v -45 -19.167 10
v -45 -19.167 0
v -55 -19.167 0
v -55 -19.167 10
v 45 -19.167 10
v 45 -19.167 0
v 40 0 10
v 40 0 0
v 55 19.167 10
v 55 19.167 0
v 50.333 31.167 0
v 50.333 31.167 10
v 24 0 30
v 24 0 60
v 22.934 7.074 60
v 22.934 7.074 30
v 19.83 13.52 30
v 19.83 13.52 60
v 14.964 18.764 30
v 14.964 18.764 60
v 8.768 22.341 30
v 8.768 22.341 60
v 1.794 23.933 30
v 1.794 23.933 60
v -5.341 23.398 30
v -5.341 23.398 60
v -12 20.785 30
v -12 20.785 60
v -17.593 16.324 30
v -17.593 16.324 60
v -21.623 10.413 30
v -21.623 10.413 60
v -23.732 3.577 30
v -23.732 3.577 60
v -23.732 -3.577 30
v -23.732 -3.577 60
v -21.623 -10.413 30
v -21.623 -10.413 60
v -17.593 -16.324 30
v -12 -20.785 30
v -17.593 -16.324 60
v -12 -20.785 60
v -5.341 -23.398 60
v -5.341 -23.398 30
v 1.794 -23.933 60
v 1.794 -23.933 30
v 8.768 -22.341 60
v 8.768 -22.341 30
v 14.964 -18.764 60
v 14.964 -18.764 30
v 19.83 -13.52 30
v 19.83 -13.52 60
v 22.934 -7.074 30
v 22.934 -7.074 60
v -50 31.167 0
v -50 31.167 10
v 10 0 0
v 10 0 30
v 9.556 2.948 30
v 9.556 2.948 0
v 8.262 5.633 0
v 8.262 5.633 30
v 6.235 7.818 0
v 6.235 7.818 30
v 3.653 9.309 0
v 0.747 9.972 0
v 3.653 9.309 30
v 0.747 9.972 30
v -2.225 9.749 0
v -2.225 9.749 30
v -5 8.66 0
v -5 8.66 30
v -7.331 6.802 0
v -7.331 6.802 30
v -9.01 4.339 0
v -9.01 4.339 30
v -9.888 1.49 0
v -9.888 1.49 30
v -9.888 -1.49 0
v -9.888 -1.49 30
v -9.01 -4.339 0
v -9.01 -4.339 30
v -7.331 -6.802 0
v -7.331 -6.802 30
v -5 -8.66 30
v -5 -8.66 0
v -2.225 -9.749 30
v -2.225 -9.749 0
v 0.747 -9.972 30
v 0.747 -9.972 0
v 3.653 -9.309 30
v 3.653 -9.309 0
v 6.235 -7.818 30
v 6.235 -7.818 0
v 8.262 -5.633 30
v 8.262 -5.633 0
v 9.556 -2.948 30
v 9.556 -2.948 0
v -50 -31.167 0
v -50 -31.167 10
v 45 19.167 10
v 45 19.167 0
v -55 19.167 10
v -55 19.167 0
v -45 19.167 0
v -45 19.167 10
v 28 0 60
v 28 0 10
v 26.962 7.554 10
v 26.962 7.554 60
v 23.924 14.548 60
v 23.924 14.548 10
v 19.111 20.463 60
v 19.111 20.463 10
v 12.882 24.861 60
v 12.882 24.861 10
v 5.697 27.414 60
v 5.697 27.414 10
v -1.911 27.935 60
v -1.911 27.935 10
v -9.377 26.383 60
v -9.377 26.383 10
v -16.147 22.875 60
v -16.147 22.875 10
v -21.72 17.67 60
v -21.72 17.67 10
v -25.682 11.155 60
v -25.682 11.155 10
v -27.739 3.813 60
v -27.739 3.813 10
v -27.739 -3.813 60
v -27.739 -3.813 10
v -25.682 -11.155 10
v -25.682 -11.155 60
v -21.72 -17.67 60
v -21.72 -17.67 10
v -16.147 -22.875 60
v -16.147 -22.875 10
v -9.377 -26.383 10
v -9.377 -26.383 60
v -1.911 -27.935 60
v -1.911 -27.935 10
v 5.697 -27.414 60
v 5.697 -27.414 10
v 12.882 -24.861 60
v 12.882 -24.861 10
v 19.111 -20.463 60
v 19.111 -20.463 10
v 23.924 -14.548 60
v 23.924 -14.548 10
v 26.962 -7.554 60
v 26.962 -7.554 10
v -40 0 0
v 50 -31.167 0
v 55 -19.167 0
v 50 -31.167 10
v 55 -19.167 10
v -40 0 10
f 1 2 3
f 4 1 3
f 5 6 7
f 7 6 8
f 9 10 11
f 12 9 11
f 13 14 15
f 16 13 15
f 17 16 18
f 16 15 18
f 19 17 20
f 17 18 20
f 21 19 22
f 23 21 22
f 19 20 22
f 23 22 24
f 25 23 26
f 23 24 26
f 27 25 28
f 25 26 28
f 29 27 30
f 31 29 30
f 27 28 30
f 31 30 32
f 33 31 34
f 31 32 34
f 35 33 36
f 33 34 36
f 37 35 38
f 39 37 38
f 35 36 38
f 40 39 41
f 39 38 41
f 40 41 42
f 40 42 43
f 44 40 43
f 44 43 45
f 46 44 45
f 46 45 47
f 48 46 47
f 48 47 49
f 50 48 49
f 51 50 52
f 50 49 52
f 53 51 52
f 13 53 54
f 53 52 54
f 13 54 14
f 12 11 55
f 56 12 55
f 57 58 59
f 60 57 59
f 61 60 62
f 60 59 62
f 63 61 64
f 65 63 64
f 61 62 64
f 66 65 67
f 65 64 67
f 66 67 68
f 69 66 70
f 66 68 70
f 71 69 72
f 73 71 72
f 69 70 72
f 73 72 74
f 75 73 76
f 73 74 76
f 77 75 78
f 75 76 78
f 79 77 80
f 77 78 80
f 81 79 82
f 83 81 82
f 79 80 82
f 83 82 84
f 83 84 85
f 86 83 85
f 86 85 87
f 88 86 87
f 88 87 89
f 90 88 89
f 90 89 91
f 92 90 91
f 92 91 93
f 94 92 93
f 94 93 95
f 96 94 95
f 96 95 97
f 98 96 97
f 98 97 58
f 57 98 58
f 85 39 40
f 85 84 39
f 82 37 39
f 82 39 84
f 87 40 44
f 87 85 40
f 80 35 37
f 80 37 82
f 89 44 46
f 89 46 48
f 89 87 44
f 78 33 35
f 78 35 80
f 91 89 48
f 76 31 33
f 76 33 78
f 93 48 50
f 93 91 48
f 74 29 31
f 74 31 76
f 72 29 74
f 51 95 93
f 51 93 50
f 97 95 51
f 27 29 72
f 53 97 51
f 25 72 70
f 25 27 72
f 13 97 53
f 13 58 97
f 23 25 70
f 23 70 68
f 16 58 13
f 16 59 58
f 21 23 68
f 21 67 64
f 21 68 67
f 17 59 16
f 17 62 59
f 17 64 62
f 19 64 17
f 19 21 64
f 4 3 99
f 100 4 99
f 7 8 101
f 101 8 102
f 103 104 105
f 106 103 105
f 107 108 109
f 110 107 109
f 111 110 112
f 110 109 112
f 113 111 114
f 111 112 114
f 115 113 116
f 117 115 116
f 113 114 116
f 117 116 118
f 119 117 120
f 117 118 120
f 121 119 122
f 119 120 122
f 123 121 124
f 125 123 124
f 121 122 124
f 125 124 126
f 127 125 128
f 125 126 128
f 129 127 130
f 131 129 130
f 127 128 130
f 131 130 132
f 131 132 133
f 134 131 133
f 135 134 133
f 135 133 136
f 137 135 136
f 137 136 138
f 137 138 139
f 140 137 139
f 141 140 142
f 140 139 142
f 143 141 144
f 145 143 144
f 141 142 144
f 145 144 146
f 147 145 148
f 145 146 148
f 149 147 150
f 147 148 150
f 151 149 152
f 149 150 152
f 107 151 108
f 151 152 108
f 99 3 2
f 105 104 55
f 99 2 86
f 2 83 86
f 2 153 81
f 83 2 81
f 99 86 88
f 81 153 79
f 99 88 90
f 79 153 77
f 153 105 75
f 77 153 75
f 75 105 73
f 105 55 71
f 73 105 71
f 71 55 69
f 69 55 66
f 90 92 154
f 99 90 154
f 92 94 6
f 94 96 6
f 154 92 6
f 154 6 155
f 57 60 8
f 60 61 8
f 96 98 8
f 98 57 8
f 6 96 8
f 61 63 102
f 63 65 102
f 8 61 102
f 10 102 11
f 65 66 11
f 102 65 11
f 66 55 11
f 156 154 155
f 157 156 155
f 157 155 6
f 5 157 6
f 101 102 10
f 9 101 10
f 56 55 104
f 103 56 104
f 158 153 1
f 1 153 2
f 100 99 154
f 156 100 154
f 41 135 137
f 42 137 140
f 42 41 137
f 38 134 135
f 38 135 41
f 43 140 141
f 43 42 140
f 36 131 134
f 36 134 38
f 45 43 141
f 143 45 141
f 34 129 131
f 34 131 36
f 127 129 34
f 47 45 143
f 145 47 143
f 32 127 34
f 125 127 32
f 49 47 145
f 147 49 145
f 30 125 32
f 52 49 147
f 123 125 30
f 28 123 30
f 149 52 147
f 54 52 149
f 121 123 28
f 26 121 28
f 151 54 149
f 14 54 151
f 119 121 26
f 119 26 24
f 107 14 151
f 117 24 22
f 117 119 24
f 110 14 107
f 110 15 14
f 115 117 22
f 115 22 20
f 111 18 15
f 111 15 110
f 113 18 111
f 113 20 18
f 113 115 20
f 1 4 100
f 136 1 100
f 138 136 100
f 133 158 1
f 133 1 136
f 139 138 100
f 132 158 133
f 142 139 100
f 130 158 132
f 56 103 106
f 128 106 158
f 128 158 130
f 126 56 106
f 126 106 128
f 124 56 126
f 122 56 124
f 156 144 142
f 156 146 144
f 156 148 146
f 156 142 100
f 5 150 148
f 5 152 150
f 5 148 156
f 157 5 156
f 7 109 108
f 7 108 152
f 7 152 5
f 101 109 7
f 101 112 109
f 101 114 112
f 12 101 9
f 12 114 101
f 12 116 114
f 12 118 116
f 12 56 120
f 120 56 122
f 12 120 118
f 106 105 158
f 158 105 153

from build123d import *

# Parameters (mm, degrees)
EXTRUDE_1_DEPTH     = 10
SKETCH_2_R          = 28
EXTRUDE_2_DEPTH     = 50
SKETCH_3_R          = 24
CUT_EXTRUDE_1_DEPTH = 30
SKETCH_4_R          = 10
CUT_EXTRUDE_2_DEPTH = 60


with BuildPart() as part:
    # Эскиз1 → Бобышка-Вытянуть1 (new body)
    with BuildSketch(Plane.XY):
        Polygon((45, 19.166666667), (55, 19.166666667), (50.333333333, 31.166666667), (-50, 31.166666667), (-55, 19.166666667), (-45, 19.166666667), (-40, 0), (-45, -19.166666667), (-55, -19.166666667), (-50, -31.166666667), (50, -31.166666667), (55, -19.166666667), (45, -19.166666667), (40, 0), align=None)
    extrude(amount=EXTRUDE_1_DEPTH)

    # Эскиз2 → Бобышка-Вытянуть2 (add)
    with BuildSketch(Plane.XY.offset(10)):
        Circle(SKETCH_2_R)
    extrude(amount=EXTRUDE_2_DEPTH)

    # Эскиз3 → Вырез-Вытянуть1 (cut)
    with BuildSketch(Plane.XY.offset(60)):
        Circle(SKETCH_3_R)
    extrude(amount=-CUT_EXTRUDE_1_DEPTH, mode=Mode.SUBTRACT)

    # Эскиз4 → Вырез-Вытянуть2 (cut)
    with BuildSketch(Plane.XY.offset(30)):
        Circle(SKETCH_4_R)
    extrude(amount=-CUT_EXTRUDE_2_DEPTH, mode=Mode.SUBTRACT)


solid = part.part
